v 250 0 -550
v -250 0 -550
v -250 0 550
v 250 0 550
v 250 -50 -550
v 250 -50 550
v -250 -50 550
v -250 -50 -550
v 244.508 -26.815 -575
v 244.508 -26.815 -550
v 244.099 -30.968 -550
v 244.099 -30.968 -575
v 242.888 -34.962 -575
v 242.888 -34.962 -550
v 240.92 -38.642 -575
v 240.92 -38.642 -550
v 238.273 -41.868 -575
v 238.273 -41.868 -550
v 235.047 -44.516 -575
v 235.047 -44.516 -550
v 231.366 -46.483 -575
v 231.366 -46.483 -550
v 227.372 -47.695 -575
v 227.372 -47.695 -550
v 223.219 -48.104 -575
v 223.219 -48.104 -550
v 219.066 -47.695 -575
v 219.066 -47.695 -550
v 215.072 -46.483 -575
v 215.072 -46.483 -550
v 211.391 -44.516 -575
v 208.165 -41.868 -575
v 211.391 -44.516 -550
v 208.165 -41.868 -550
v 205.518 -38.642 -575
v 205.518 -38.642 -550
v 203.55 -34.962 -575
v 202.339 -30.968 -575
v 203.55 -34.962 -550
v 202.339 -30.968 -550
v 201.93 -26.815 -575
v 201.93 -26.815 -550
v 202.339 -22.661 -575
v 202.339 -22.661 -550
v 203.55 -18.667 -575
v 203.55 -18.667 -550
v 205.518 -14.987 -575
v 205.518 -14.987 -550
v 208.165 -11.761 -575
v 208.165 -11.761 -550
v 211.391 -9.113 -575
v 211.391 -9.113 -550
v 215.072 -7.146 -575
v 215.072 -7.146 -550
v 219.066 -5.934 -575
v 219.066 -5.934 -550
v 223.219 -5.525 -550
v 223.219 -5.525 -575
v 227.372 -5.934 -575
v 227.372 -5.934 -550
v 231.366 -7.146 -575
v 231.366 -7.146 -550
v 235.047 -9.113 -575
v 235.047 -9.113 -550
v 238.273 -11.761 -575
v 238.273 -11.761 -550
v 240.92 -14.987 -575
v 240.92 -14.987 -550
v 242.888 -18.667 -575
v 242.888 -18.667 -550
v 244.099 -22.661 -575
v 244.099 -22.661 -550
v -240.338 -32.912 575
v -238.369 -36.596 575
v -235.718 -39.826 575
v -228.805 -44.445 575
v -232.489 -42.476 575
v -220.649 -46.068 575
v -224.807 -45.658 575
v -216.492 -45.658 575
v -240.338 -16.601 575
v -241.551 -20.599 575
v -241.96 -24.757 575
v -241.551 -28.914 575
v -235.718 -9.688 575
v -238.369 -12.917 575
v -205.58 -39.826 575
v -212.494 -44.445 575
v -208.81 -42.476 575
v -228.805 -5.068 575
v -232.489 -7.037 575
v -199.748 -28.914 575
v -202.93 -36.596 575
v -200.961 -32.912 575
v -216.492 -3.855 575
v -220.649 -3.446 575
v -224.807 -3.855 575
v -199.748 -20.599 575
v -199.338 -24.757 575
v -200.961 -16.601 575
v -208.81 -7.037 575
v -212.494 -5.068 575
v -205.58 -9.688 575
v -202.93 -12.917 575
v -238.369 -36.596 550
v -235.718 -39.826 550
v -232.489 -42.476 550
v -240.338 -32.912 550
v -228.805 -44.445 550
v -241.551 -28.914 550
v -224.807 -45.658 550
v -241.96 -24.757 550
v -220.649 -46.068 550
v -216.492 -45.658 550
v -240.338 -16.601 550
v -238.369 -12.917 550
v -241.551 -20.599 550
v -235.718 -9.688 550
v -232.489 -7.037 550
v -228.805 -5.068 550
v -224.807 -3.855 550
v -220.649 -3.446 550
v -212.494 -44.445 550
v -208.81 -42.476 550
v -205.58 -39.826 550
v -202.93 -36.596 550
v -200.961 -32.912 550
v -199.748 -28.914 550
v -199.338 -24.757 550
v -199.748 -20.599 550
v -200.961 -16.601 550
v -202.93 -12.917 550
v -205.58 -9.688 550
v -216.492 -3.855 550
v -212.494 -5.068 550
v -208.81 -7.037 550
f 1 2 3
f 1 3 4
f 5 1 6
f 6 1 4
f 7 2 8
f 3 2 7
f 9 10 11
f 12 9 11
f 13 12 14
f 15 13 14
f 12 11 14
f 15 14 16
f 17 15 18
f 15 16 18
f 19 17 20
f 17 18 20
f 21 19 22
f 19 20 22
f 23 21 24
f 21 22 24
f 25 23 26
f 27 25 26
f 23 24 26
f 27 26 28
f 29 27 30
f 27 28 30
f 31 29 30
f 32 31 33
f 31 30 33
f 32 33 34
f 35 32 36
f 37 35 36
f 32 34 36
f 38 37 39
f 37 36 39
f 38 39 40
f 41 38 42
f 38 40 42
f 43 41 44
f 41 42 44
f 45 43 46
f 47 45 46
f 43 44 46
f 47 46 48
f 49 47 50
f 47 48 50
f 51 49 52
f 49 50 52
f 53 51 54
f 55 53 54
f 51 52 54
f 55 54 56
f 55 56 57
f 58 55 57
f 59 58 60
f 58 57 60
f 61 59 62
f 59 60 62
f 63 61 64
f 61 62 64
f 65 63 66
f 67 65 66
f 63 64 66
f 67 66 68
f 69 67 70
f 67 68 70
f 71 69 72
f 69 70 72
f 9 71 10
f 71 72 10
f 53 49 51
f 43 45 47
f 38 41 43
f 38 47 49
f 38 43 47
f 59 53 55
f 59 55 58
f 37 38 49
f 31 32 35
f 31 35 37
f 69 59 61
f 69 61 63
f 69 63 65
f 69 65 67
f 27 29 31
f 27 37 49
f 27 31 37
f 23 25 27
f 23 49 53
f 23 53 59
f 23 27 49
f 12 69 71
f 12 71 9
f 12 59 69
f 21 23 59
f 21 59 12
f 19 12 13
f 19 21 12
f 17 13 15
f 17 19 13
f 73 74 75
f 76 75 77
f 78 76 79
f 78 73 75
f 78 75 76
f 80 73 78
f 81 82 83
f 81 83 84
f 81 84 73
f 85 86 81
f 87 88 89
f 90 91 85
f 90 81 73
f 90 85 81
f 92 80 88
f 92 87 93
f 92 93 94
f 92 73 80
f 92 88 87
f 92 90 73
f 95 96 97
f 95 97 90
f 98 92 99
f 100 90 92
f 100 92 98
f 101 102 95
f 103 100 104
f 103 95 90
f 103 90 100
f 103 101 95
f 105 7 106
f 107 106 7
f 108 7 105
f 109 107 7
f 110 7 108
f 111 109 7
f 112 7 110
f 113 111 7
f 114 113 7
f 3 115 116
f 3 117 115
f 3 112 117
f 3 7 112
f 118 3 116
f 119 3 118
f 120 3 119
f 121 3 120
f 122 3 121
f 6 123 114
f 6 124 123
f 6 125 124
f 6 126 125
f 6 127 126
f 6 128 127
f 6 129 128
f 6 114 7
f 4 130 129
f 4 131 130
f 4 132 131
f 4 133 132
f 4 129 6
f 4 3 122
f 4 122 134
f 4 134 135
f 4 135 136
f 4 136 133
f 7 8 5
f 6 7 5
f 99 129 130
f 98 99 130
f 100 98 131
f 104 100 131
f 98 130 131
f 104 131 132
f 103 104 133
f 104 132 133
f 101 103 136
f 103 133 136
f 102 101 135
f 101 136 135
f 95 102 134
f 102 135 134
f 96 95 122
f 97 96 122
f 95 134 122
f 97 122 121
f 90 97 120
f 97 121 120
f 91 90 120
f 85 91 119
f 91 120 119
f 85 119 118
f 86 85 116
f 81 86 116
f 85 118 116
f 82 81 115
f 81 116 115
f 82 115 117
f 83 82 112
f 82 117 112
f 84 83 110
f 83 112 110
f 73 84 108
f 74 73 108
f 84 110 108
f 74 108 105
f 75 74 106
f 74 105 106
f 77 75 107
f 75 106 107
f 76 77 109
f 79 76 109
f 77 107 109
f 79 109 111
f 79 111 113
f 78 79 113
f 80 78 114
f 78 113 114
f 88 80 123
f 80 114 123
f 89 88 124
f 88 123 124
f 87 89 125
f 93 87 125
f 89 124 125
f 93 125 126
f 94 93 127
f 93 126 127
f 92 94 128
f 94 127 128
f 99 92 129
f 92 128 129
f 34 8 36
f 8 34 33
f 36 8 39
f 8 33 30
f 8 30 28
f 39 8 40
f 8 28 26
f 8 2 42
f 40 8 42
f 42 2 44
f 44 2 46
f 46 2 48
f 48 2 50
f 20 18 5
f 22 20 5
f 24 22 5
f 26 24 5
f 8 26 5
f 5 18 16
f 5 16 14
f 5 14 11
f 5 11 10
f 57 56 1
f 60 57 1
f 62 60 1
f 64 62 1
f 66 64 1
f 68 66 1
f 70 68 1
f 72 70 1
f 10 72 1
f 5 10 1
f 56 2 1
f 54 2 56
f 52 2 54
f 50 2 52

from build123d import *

# Parameters (mm, degrees)
F0_W     = 500
F0_H     = 1100
F1_DEPTH = 50
F2_R     = 21.310821
F3_DEPTH = 25
F4_R     = 21.289227
F5_DEPTH = 25


with BuildPart() as f1:
    # F0 (on Front) → F1 (new body)
    with BuildSketch(Plane.XZ):
        Rectangle(F0_W, F0_H)
    extrude(amount=F1_DEPTH)

    # F2 (on face) → F3 (join)
    with BuildSketch(Plane.XY.offset(550)):
        with Locations((-220.649317, -24.756737)):
            Circle(F2_R)
    extrude(amount=F3_DEPTH)

    # F4 (on face) → F5 (join)
    with BuildSketch(Plane(origin=(0, 0, -550), x_dir=(1, 0, 0), z_dir=(0, 0, -1))):
        with Locations((223.219097, 26.814517)):
            Circle(F4_R)
    extrude(amount=F5_DEPTH)


solid = f1.part
